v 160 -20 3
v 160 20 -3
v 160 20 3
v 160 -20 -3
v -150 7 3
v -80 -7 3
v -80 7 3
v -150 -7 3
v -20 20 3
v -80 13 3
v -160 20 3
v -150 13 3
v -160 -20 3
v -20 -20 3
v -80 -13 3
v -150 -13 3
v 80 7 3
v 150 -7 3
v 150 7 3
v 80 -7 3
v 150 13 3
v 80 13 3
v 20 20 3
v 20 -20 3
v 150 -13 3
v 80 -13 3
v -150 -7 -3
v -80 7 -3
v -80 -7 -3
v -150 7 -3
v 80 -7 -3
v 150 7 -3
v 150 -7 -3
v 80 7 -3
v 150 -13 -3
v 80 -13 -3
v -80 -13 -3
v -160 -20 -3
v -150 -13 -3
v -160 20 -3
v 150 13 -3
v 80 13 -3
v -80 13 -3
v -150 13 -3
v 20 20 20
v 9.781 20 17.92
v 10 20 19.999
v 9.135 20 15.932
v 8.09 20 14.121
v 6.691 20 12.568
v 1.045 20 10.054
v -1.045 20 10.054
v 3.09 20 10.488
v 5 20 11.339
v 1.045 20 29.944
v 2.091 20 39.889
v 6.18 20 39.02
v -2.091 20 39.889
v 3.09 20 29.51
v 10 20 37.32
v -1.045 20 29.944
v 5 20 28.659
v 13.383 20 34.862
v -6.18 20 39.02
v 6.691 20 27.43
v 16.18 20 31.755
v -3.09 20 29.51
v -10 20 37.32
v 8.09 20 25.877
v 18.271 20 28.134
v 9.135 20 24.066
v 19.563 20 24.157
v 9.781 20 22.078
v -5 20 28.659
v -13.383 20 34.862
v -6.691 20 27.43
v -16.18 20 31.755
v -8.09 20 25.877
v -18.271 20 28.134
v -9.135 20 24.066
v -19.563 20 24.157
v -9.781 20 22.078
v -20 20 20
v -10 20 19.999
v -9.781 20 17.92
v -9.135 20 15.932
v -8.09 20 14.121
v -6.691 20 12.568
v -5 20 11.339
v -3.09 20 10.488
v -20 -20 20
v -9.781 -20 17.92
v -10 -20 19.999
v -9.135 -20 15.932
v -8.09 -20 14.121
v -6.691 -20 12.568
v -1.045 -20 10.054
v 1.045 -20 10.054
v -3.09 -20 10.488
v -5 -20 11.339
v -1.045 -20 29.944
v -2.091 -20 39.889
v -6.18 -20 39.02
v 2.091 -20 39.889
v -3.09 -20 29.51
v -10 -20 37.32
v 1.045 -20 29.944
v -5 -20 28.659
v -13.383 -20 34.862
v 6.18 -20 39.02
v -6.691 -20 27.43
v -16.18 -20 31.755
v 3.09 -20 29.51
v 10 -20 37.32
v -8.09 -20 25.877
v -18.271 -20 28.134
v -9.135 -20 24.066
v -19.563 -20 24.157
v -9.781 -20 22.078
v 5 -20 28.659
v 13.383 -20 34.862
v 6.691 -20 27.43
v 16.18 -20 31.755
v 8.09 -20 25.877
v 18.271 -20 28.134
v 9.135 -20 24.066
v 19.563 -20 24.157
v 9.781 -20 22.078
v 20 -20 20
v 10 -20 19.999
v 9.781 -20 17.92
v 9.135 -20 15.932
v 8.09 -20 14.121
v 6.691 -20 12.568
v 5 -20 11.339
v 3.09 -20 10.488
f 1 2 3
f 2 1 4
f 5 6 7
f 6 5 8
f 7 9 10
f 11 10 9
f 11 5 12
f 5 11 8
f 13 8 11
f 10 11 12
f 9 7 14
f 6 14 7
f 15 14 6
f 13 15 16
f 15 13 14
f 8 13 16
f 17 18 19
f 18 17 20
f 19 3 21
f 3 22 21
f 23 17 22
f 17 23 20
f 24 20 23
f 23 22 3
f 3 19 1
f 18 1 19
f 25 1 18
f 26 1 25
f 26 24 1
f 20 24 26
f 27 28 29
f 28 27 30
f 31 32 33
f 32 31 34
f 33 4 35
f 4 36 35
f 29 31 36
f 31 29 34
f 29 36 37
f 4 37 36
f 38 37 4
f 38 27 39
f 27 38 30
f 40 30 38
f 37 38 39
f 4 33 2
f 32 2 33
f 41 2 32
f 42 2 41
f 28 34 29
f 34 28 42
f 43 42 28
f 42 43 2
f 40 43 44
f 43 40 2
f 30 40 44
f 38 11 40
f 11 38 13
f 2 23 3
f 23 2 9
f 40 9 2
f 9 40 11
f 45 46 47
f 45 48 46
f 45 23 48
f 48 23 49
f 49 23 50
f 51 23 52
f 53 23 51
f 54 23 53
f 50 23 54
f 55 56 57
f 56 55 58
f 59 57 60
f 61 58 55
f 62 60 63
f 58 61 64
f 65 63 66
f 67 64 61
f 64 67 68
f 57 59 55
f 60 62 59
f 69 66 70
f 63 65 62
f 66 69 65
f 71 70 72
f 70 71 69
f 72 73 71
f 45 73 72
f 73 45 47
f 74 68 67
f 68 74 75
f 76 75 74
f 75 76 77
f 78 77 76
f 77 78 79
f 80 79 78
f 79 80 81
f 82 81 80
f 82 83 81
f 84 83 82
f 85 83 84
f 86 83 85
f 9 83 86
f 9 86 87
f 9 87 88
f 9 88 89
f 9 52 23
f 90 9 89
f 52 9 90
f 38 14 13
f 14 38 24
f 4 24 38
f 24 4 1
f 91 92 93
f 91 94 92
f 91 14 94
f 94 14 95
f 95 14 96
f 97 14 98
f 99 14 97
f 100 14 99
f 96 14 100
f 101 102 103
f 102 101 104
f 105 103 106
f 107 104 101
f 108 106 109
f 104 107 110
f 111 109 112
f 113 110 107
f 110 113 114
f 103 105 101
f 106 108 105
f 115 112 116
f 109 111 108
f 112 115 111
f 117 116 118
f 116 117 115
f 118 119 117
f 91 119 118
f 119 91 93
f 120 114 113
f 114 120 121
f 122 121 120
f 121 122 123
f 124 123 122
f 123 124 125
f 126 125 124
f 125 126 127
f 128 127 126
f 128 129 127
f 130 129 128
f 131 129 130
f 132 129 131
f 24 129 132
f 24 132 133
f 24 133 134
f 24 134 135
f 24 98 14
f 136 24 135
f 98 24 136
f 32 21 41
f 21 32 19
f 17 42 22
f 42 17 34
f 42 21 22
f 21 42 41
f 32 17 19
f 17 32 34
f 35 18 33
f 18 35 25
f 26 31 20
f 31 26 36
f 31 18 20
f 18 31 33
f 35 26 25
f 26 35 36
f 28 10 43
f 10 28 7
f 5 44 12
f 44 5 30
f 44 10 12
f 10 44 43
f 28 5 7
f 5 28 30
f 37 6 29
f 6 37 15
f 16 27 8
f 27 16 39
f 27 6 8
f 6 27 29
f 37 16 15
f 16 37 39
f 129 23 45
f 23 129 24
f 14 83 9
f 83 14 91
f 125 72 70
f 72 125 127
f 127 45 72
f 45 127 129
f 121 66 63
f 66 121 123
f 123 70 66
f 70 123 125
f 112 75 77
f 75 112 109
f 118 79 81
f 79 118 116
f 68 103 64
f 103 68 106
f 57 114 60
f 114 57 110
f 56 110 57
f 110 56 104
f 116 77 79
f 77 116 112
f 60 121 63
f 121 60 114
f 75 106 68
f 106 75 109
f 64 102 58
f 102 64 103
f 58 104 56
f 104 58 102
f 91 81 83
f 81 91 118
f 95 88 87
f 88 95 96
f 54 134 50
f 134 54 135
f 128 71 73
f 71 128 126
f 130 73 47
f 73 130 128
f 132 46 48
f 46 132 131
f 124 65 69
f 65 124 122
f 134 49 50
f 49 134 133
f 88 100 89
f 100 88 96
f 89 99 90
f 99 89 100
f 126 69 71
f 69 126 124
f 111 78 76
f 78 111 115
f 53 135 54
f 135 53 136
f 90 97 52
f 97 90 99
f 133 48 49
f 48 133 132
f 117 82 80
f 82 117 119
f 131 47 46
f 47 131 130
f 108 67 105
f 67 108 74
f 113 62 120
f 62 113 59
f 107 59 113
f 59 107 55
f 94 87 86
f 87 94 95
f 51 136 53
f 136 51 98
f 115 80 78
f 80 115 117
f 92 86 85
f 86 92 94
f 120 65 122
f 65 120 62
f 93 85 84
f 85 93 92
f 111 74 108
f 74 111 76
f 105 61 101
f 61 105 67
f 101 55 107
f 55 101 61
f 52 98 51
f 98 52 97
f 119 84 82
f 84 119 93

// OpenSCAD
x_base = 160*2;
y_base = 40;
z_base = 6;

rail_lenth = 70;
x_displace = x_base/2-10-rail_lenth/2;
y_displace = 10;
r_hole=3;

difference(){
    cube([x_base,y_base,z_base],center=true);
    translate([x_displace,y_displace,0])
        cube([rail_lenth,r_hole*2,z_base+1],center=true);
    translate([x_displace,-y_displace,0])
        cube([rail_lenth,r_hole*2,z_base+1],center=true);
    translate([-x_displace,y_displace,0])
        cube([rail_lenth,r_hole*2,z_base+1],center=true);
    translate([-x_displace,-y_displace,0])
        cube([rail_lenth,r_hole*2,z_base+1],center=true);
}

//handle
x_handle = 40;
y_handle = 40;
z_handle = 40;
r_handle_hole = 10;
translate([0,0,z_handle/2-0.001])
//difference(){
//    intersection(){
//        cube([x_handle,y_handle,z_handle],center=true);
//        rotate([90,0,0])
//        cylinder(h=40,r=r_handle_hole*2,center=true);
//
//    }
//    rotate([90,0,0])
//    cylinder(h=42,r=r_handle_hole,center=true);
//}

difference(){
    union(){
    translate([0,0,-z_handle/4+0.001])
    cube([x_handle,y_handle,z_handle/2],center=true);
    
    rotate([90,0,0])
    cylinder(h=40,r=r_handle_hole*2,center=true);
    }
    rotate([90,0,0])
    cylinder(h=42,r=r_handle_hole,center=true);
}
